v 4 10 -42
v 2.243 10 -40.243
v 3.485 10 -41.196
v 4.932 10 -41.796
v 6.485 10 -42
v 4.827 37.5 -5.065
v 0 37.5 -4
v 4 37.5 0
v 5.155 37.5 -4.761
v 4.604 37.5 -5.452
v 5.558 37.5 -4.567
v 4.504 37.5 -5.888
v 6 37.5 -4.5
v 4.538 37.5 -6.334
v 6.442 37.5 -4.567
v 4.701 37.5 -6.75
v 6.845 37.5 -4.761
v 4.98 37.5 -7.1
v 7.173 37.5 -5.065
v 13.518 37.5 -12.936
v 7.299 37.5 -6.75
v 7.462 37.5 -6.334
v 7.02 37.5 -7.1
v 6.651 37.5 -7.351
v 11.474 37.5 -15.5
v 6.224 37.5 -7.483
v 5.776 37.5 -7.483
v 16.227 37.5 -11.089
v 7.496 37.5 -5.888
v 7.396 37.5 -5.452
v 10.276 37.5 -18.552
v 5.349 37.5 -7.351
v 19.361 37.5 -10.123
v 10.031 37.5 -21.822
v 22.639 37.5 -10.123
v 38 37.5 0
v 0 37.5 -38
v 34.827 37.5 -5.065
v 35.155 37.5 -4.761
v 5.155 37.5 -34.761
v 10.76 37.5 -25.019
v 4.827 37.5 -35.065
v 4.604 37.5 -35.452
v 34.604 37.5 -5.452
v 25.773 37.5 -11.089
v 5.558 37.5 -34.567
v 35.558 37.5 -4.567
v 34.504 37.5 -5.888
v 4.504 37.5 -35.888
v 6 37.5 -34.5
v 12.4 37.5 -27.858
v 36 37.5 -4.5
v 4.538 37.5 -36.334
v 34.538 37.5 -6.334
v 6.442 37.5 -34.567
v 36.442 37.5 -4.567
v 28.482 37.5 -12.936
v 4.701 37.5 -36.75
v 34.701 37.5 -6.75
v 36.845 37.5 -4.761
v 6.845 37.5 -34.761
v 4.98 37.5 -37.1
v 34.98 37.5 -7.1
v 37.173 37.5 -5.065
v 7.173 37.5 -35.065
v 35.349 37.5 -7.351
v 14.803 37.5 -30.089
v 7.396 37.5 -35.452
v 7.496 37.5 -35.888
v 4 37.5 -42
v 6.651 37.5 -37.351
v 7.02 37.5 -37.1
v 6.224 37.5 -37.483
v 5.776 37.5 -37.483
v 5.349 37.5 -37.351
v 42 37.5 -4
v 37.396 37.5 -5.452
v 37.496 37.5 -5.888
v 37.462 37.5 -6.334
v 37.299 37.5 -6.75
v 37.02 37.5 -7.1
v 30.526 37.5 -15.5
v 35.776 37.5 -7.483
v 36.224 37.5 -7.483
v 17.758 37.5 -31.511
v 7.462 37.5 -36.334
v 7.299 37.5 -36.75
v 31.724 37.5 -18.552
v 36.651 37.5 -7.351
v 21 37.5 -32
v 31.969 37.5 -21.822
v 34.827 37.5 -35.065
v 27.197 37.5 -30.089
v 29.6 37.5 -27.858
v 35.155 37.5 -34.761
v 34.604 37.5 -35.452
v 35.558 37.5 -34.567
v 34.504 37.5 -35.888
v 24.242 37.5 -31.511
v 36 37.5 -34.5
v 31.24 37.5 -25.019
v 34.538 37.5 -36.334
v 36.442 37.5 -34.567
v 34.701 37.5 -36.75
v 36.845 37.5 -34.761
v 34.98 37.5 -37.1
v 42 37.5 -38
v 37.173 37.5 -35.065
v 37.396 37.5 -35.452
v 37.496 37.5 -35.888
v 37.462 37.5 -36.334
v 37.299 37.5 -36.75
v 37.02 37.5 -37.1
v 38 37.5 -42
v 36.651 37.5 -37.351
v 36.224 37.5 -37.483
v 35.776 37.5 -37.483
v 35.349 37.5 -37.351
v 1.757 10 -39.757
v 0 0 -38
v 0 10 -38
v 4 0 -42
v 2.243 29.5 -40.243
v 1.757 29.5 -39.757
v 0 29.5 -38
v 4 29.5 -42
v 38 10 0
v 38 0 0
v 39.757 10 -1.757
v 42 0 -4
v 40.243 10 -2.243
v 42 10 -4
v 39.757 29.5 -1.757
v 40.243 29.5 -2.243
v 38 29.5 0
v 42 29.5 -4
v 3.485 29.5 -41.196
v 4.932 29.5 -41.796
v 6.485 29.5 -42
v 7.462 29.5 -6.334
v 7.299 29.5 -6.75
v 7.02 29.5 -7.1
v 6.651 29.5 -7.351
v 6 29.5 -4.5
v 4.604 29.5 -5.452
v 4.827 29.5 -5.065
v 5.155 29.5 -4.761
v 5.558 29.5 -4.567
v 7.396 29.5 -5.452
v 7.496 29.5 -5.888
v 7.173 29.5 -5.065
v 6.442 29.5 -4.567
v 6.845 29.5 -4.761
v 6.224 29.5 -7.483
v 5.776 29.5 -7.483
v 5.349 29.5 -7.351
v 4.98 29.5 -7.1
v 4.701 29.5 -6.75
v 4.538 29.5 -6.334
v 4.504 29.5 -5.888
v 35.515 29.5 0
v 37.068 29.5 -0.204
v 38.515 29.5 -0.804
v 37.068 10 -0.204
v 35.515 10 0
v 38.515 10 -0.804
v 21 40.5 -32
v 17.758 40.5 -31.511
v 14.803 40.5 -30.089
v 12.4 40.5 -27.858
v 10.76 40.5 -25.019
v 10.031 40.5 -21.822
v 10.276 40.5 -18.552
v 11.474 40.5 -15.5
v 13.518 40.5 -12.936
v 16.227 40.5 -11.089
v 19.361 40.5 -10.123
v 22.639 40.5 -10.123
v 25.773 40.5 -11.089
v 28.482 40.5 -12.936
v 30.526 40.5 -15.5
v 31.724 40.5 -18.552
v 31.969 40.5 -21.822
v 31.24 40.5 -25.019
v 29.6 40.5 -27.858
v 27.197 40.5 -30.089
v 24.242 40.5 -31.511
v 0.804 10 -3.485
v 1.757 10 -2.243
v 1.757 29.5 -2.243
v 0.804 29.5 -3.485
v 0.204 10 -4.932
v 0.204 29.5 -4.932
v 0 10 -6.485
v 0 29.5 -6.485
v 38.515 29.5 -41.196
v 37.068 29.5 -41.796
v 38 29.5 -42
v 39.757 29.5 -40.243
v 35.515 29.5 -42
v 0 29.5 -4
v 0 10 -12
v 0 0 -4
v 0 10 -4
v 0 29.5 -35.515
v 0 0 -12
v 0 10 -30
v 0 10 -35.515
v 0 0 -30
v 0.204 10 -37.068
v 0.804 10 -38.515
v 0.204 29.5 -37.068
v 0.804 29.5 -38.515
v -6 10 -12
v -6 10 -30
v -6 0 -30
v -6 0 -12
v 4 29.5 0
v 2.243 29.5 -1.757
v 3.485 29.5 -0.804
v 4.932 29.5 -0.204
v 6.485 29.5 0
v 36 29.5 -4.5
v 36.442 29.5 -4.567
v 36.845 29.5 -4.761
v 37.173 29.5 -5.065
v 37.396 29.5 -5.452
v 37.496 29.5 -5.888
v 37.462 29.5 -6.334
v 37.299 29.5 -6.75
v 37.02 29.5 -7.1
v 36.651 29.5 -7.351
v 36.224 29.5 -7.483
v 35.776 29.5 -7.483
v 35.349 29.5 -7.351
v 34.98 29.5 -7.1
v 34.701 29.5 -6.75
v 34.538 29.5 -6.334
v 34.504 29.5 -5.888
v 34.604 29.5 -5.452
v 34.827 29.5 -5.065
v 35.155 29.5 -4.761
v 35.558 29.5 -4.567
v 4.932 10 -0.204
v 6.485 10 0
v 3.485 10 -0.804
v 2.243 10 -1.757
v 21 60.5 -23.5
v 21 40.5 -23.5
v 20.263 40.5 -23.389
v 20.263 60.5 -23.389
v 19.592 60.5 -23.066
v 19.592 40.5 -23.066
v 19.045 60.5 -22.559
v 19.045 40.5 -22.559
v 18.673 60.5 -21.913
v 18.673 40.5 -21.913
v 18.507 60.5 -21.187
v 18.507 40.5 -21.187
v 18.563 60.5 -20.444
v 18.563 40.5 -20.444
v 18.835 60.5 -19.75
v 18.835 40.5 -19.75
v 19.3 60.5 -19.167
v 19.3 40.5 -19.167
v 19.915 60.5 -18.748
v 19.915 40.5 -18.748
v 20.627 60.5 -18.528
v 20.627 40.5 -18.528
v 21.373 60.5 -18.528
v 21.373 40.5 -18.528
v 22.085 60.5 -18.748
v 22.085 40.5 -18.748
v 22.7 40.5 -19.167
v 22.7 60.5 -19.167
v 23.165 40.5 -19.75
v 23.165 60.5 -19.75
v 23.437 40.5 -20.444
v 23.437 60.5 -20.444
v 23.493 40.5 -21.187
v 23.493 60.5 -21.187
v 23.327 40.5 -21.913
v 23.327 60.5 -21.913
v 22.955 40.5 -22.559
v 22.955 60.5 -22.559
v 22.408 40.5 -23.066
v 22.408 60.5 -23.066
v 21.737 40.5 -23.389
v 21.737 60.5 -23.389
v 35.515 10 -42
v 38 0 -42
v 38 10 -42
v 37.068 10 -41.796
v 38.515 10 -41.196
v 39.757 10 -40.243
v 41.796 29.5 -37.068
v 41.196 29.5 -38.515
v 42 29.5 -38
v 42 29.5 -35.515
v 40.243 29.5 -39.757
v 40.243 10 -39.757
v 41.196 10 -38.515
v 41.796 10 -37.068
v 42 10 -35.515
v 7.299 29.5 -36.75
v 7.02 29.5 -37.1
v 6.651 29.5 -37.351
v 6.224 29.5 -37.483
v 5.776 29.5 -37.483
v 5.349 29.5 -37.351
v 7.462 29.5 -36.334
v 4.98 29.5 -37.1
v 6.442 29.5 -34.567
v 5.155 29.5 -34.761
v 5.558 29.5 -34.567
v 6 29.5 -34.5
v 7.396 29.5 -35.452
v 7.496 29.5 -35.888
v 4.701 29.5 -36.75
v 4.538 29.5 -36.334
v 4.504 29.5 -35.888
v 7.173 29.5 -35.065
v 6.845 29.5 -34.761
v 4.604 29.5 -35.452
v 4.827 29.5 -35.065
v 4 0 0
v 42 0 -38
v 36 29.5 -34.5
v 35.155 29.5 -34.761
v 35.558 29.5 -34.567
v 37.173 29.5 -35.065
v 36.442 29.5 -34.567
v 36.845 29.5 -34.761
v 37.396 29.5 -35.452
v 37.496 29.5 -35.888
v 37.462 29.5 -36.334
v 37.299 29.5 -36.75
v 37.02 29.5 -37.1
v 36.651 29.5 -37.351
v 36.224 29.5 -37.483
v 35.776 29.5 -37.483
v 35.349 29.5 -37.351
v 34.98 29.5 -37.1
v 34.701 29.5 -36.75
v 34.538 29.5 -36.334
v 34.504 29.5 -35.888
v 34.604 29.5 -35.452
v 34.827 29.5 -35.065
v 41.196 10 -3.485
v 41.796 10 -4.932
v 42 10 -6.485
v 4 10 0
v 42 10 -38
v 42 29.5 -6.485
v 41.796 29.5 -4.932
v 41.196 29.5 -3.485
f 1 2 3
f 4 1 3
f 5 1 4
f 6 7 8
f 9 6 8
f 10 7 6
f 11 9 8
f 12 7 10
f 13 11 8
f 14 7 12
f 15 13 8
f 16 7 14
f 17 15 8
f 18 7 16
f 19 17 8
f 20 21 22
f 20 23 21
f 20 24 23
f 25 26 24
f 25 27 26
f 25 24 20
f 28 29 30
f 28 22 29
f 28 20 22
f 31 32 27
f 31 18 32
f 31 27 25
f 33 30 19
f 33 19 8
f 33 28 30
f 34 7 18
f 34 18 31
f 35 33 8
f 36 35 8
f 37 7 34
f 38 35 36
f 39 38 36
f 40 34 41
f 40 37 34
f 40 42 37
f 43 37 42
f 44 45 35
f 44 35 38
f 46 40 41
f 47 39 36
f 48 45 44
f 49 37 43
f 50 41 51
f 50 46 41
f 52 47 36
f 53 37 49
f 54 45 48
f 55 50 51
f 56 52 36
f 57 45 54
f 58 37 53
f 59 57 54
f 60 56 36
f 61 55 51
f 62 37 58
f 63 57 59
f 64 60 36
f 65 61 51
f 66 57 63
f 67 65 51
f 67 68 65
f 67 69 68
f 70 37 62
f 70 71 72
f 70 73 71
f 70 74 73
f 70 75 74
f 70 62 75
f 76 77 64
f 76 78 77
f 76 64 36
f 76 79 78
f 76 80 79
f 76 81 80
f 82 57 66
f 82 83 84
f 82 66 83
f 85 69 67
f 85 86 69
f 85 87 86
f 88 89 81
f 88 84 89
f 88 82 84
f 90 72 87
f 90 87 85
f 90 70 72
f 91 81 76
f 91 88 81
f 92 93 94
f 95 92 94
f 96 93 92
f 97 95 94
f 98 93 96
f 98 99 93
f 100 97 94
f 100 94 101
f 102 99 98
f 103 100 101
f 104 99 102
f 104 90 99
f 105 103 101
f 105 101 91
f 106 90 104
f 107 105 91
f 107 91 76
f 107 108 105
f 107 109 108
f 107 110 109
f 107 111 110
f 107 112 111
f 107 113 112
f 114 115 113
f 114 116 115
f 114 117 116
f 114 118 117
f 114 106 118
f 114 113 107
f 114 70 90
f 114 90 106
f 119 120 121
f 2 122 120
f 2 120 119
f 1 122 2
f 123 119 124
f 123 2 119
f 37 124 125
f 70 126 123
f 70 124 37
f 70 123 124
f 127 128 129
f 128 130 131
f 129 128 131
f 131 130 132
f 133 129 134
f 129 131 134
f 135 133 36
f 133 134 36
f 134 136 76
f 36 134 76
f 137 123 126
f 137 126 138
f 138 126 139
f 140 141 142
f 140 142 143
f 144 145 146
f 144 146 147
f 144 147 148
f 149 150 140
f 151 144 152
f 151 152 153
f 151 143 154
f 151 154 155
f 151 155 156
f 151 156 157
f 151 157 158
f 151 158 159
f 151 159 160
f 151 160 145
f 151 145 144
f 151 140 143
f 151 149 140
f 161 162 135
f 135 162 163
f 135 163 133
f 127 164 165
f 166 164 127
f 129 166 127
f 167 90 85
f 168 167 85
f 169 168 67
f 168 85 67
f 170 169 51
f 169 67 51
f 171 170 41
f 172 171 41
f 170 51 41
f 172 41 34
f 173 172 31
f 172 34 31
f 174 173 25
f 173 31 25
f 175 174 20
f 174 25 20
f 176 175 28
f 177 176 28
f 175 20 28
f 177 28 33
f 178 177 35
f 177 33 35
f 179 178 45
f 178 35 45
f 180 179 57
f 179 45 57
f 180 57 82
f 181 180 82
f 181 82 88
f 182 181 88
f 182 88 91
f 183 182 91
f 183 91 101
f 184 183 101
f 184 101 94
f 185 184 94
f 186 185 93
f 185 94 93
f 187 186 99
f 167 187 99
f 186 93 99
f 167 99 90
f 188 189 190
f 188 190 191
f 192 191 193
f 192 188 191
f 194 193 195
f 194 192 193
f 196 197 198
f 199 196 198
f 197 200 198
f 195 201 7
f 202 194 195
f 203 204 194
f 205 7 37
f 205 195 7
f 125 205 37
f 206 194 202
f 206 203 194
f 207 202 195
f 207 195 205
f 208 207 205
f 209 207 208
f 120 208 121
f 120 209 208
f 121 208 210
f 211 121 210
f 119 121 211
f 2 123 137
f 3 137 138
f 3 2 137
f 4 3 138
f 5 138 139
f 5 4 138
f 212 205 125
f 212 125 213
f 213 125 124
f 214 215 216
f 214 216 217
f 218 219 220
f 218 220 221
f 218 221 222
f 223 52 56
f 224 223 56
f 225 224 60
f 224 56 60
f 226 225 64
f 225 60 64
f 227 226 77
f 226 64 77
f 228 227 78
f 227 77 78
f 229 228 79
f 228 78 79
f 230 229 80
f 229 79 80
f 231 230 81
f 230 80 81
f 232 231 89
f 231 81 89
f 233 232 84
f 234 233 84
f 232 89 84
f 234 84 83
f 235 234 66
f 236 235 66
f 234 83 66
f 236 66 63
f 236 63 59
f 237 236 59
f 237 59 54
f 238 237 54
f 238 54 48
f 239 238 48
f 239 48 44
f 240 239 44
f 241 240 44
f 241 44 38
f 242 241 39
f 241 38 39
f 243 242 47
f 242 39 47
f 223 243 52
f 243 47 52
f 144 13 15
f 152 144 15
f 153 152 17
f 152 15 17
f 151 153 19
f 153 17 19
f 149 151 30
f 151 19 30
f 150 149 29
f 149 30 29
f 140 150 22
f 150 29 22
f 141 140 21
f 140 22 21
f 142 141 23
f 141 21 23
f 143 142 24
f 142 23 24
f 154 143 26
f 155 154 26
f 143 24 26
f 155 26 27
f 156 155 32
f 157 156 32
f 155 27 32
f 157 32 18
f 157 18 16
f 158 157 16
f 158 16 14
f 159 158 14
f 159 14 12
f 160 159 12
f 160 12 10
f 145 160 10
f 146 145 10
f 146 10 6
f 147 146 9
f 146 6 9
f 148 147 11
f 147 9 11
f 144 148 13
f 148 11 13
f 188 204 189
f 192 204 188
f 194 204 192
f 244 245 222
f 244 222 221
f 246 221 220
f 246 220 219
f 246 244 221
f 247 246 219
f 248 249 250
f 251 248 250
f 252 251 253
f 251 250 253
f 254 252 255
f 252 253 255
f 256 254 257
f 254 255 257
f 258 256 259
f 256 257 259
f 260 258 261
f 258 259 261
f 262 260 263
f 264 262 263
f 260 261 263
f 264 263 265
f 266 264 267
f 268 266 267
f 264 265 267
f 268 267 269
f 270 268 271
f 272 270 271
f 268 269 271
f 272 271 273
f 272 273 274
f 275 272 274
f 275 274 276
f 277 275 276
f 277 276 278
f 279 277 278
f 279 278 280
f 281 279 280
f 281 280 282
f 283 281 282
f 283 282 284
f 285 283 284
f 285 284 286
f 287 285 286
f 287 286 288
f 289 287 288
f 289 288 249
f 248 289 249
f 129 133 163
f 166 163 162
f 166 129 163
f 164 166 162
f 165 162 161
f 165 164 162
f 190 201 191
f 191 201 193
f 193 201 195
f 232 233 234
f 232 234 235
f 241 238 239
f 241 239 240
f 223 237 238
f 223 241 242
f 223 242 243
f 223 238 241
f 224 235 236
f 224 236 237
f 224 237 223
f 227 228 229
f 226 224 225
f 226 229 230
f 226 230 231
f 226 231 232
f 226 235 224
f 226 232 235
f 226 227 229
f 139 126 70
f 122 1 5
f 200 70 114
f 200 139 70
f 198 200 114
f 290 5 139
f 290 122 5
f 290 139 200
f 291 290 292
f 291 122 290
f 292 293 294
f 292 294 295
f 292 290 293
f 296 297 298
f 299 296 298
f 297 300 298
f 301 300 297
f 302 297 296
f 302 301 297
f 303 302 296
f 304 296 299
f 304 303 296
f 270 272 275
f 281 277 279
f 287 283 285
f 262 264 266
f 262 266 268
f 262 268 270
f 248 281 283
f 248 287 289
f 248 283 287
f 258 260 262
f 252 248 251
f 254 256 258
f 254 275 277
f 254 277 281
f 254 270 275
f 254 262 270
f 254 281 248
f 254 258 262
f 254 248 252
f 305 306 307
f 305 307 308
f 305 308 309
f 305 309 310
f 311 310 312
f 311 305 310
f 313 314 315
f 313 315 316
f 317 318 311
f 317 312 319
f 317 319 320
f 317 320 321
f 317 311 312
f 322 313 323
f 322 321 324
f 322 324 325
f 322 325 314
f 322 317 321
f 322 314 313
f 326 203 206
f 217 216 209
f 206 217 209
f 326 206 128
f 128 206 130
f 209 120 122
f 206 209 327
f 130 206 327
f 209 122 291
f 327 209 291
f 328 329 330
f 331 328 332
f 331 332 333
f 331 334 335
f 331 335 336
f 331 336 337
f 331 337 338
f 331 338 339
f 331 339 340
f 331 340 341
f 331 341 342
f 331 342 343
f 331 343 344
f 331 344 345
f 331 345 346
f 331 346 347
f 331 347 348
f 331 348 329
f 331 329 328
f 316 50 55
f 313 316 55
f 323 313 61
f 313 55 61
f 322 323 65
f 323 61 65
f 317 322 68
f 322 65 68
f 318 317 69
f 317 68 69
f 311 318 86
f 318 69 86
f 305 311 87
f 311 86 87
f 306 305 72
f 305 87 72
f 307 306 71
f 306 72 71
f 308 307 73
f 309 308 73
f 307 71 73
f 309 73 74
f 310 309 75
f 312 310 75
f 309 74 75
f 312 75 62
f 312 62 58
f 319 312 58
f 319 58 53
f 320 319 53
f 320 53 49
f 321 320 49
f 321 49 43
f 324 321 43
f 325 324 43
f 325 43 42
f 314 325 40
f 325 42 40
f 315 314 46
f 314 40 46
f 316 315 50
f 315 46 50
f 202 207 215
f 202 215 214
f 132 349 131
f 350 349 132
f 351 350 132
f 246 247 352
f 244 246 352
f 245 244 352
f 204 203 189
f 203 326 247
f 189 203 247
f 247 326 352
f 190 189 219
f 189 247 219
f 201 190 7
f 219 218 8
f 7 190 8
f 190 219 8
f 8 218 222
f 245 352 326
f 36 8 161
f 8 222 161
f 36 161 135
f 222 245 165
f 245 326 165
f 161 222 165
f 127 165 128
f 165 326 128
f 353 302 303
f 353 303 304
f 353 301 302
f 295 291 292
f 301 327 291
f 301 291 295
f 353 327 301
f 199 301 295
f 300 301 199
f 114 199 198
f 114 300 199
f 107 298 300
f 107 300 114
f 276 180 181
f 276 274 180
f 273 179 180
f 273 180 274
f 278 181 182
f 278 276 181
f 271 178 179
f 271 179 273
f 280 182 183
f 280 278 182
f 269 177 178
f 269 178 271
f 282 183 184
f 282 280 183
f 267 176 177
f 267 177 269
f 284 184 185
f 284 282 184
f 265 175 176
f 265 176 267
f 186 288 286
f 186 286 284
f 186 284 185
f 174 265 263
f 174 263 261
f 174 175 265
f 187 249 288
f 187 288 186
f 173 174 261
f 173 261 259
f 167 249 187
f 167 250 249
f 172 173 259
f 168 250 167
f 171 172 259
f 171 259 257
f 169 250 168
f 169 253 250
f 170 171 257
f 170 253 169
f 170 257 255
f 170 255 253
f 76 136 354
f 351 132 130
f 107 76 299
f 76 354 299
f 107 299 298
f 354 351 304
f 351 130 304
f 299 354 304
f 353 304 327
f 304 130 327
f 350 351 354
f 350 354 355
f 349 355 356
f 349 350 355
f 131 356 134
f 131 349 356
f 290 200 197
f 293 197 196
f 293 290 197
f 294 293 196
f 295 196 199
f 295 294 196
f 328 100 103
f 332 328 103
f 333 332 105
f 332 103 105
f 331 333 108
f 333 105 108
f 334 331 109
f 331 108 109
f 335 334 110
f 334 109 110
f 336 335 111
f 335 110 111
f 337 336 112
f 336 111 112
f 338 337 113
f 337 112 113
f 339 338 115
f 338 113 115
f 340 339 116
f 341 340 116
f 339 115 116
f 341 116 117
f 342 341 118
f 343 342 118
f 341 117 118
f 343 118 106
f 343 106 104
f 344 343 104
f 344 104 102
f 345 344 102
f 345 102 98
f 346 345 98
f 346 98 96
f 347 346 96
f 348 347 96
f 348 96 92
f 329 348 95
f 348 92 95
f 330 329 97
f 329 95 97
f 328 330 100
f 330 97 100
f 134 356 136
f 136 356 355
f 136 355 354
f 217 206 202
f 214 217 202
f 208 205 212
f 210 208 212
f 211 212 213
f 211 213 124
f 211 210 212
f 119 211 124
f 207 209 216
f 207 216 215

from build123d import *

# Parameters (mm, degrees)
SKETCH1_W           = 42
SKETCH1_H           = 42
BOSS_EXTRUDE1_DEPTH = 37.5
SKETCH2_R           = 2.5
BOSS_EXTRUDE2_DEPTH = 23
SKETCH3_R           = 1.5
CUT_EXTRUDE1_DEPTH  = 8
SKETCH4_R           = 11
BOSS_EXTRUDE3_DEPTH = 3
CHAMFER1_SIZE       = 4
SKETCH5_W           = 18
SKETCH5_H           = 10
BOSS_EXTRUDE4_DEPTH = 6
FILLET1_START       = 10
FILLET1_DEPTH       = 19.5
FILLET2_START       = 10
FILLET2_DEPTH       = 19.5
FILLET3_START       = 10
FILLET3_DEPTH       = 19.5


with BuildPart() as part:
    # Sketch1 → Boss-Extrude1 (new body)
    with BuildSketch(Plane(origin=(0, 0, 0), x_dir=(1, 0, 0), z_dir=(0, 1, 0))):
        with Locations((21, 21)):
            Rectangle(SKETCH1_W, SKETCH1_H)
    extrude(amount=BOSS_EXTRUDE1_DEPTH)

    # Sketch2 → Boss-Extrude2 (add)
    with BuildSketch(Plane(origin=(0, 37.5, 0), x_dir=(1, 0, 0), z_dir=(0, 1, 0))):
        with Locations(Location((21, 21, 0), (0, 0, 90))):
            Circle(SKETCH2_R)
    extrude(amount=BOSS_EXTRUDE2_DEPTH)

    # Sketch3 → Cut-Extrude1 (cut)
    with BuildSketch(Plane(origin=(0, 37.5, 0), x_dir=(1, 0, 0), z_dir=(0, 1, 0))):
        with Locations(Location((6, 36, 0), (0, 0, 270))):
            Circle(SKETCH3_R)
        with Locations(Location((36, 36, 0), (0, 0, 270))):
            Circle(SKETCH3_R)
        with Locations(Location((36, 6, 0), (0, 0, 270))):
            Circle(SKETCH3_R)
        with Locations(Location((6, 6, 0), (0, 0, 270))):
            Circle(SKETCH3_R)
    extrude(amount=-CUT_EXTRUDE1_DEPTH, mode=Mode.SUBTRACT)

    # Sketch4 → Boss-Extrude3 (add)
    with BuildSketch(Plane(origin=(0, 37.5, 0), x_dir=(1, 0, 0), z_dir=(0, 1, 0))):
        with Locations(Location((21, 21, 0), (0, 0, 90))):
            Circle(SKETCH4_R)
    extrude(amount=BOSS_EXTRUDE3_DEPTH)

    # Chamfer1
    chamfer1_edges = [part.edges().sort_by_distance(p)[0] for p in [
        (0, 18.75, -42),
        (42, 18.75, -42),
        (42, 18.75, 0),
        (0, 18.75, 0),
    ]]
    chamfer(chamfer1_edges, length=CHAMFER1_SIZE)

    # Sketch5 → Boss-Extrude4 (add)
    with BuildSketch(Plane.ZY):
        with Locations((-21, 5)):
            Rectangle(SKETCH5_W, SKETCH5_H)
    extrude(amount=BOSS_EXTRUDE4_DEPTH)

    # Fillet1: read off the stored shape, not the designer's step
    # Fillet1 outline → Fillet1 (cut)
    with BuildSketch(Plane(origin=(0, 0, 0), x_dir=(1, 0, 0), z_dir=(0, 1, 0)).offset(FILLET1_START)):
        with BuildLine():
            ThreePointArc((42, 6.485281374), (41.543277195, 4.18918078), (40.242640687, 2.242640687))
            Line((40.242640687, 2.242640687), (42, 4))
            Line((42, 4), (42, 6.485281374))
        make_face()
        with BuildLine():
            ThreePointArc((39.757359313, 1.757359313), (37.81081922, 0.456722805), (35.514718626, 0))
            Line((35.514718626, 0), (38, 0))
            Line((38, 0), (39.757359313, 1.757359313))
        make_face()
    extrude(amount=FILLET1_DEPTH, mode=Mode.SUBTRACT)

    # Fillet2: read off the stored shape, not the designer's step
    # Fillet2 outline → Fillet2 (cut)
    with BuildSketch(Plane(origin=(0, 0, 0), x_dir=(1, 0, 0), z_dir=(0, 1, 0)).offset(FILLET2_START)):
        with BuildLine():
            ThreePointArc((35.514718626, 42), (37.81081922, 41.543277195), (39.757359313, 40.242640687))
            Line((39.757359313, 40.242640687), (38, 42))
            Line((38, 42), (35.514718626, 42))
        make_face()
        with BuildLine():
            ThreePointArc((40.242640687, 39.757359313), (41.543277195, 37.81081922), (42, 35.514718626))
            Line((42, 35.514718626), (42, 38))
            Line((42, 38), (40.242640687, 39.757359313))
        make_face()
    extrude(amount=FILLET2_DEPTH, mode=Mode.SUBTRACT)

    # Fillet3: read off the stored shape, not the designer's step
    # Fillet3 outline → Fillet3 (cut)
    with BuildSketch(Plane(origin=(0, 0, 0), x_dir=(1, 0, 0), z_dir=(0, 1, 0)).offset(FILLET3_START)):
        with BuildLine():
            ThreePointArc((6.485281374, 0), (4.18918078, 0.456722805), (2.242640687, 1.757359313))
            Line((2.242640687, 1.757359313), (4, 0))
            Line((4, 0), (6.485281374, 0))
        make_face()
        with BuildLine():
            ThreePointArc((1.757359313, 2.242640687), (0.456722805, 4.18918078), (0, 6.485281374))
            Line((0, 6.485281374), (0, 4))
            Line((0, 4), (1.757359313, 2.242640687))
        make_face()
        with BuildLine():
            ThreePointArc((0, 35.514718626), (0.456722805, 37.81081922), (1.757359313, 39.757359313))
            Line((1.757359313, 39.757359313), (0, 38))
            Line((0, 38), (0, 35.514718626))
        make_face()
        with BuildLine():
            ThreePointArc((2.242640687, 40.242640687), (4.18918078, 41.543277195), (6.485281374, 42))
            Line((6.485281374, 42), (4, 42))
            Line((4, 42), (2.242640687, 40.242640687))
        make_face()
    extrude(amount=FILLET3_DEPTH, mode=Mode.SUBTRACT)


solid = part.part
